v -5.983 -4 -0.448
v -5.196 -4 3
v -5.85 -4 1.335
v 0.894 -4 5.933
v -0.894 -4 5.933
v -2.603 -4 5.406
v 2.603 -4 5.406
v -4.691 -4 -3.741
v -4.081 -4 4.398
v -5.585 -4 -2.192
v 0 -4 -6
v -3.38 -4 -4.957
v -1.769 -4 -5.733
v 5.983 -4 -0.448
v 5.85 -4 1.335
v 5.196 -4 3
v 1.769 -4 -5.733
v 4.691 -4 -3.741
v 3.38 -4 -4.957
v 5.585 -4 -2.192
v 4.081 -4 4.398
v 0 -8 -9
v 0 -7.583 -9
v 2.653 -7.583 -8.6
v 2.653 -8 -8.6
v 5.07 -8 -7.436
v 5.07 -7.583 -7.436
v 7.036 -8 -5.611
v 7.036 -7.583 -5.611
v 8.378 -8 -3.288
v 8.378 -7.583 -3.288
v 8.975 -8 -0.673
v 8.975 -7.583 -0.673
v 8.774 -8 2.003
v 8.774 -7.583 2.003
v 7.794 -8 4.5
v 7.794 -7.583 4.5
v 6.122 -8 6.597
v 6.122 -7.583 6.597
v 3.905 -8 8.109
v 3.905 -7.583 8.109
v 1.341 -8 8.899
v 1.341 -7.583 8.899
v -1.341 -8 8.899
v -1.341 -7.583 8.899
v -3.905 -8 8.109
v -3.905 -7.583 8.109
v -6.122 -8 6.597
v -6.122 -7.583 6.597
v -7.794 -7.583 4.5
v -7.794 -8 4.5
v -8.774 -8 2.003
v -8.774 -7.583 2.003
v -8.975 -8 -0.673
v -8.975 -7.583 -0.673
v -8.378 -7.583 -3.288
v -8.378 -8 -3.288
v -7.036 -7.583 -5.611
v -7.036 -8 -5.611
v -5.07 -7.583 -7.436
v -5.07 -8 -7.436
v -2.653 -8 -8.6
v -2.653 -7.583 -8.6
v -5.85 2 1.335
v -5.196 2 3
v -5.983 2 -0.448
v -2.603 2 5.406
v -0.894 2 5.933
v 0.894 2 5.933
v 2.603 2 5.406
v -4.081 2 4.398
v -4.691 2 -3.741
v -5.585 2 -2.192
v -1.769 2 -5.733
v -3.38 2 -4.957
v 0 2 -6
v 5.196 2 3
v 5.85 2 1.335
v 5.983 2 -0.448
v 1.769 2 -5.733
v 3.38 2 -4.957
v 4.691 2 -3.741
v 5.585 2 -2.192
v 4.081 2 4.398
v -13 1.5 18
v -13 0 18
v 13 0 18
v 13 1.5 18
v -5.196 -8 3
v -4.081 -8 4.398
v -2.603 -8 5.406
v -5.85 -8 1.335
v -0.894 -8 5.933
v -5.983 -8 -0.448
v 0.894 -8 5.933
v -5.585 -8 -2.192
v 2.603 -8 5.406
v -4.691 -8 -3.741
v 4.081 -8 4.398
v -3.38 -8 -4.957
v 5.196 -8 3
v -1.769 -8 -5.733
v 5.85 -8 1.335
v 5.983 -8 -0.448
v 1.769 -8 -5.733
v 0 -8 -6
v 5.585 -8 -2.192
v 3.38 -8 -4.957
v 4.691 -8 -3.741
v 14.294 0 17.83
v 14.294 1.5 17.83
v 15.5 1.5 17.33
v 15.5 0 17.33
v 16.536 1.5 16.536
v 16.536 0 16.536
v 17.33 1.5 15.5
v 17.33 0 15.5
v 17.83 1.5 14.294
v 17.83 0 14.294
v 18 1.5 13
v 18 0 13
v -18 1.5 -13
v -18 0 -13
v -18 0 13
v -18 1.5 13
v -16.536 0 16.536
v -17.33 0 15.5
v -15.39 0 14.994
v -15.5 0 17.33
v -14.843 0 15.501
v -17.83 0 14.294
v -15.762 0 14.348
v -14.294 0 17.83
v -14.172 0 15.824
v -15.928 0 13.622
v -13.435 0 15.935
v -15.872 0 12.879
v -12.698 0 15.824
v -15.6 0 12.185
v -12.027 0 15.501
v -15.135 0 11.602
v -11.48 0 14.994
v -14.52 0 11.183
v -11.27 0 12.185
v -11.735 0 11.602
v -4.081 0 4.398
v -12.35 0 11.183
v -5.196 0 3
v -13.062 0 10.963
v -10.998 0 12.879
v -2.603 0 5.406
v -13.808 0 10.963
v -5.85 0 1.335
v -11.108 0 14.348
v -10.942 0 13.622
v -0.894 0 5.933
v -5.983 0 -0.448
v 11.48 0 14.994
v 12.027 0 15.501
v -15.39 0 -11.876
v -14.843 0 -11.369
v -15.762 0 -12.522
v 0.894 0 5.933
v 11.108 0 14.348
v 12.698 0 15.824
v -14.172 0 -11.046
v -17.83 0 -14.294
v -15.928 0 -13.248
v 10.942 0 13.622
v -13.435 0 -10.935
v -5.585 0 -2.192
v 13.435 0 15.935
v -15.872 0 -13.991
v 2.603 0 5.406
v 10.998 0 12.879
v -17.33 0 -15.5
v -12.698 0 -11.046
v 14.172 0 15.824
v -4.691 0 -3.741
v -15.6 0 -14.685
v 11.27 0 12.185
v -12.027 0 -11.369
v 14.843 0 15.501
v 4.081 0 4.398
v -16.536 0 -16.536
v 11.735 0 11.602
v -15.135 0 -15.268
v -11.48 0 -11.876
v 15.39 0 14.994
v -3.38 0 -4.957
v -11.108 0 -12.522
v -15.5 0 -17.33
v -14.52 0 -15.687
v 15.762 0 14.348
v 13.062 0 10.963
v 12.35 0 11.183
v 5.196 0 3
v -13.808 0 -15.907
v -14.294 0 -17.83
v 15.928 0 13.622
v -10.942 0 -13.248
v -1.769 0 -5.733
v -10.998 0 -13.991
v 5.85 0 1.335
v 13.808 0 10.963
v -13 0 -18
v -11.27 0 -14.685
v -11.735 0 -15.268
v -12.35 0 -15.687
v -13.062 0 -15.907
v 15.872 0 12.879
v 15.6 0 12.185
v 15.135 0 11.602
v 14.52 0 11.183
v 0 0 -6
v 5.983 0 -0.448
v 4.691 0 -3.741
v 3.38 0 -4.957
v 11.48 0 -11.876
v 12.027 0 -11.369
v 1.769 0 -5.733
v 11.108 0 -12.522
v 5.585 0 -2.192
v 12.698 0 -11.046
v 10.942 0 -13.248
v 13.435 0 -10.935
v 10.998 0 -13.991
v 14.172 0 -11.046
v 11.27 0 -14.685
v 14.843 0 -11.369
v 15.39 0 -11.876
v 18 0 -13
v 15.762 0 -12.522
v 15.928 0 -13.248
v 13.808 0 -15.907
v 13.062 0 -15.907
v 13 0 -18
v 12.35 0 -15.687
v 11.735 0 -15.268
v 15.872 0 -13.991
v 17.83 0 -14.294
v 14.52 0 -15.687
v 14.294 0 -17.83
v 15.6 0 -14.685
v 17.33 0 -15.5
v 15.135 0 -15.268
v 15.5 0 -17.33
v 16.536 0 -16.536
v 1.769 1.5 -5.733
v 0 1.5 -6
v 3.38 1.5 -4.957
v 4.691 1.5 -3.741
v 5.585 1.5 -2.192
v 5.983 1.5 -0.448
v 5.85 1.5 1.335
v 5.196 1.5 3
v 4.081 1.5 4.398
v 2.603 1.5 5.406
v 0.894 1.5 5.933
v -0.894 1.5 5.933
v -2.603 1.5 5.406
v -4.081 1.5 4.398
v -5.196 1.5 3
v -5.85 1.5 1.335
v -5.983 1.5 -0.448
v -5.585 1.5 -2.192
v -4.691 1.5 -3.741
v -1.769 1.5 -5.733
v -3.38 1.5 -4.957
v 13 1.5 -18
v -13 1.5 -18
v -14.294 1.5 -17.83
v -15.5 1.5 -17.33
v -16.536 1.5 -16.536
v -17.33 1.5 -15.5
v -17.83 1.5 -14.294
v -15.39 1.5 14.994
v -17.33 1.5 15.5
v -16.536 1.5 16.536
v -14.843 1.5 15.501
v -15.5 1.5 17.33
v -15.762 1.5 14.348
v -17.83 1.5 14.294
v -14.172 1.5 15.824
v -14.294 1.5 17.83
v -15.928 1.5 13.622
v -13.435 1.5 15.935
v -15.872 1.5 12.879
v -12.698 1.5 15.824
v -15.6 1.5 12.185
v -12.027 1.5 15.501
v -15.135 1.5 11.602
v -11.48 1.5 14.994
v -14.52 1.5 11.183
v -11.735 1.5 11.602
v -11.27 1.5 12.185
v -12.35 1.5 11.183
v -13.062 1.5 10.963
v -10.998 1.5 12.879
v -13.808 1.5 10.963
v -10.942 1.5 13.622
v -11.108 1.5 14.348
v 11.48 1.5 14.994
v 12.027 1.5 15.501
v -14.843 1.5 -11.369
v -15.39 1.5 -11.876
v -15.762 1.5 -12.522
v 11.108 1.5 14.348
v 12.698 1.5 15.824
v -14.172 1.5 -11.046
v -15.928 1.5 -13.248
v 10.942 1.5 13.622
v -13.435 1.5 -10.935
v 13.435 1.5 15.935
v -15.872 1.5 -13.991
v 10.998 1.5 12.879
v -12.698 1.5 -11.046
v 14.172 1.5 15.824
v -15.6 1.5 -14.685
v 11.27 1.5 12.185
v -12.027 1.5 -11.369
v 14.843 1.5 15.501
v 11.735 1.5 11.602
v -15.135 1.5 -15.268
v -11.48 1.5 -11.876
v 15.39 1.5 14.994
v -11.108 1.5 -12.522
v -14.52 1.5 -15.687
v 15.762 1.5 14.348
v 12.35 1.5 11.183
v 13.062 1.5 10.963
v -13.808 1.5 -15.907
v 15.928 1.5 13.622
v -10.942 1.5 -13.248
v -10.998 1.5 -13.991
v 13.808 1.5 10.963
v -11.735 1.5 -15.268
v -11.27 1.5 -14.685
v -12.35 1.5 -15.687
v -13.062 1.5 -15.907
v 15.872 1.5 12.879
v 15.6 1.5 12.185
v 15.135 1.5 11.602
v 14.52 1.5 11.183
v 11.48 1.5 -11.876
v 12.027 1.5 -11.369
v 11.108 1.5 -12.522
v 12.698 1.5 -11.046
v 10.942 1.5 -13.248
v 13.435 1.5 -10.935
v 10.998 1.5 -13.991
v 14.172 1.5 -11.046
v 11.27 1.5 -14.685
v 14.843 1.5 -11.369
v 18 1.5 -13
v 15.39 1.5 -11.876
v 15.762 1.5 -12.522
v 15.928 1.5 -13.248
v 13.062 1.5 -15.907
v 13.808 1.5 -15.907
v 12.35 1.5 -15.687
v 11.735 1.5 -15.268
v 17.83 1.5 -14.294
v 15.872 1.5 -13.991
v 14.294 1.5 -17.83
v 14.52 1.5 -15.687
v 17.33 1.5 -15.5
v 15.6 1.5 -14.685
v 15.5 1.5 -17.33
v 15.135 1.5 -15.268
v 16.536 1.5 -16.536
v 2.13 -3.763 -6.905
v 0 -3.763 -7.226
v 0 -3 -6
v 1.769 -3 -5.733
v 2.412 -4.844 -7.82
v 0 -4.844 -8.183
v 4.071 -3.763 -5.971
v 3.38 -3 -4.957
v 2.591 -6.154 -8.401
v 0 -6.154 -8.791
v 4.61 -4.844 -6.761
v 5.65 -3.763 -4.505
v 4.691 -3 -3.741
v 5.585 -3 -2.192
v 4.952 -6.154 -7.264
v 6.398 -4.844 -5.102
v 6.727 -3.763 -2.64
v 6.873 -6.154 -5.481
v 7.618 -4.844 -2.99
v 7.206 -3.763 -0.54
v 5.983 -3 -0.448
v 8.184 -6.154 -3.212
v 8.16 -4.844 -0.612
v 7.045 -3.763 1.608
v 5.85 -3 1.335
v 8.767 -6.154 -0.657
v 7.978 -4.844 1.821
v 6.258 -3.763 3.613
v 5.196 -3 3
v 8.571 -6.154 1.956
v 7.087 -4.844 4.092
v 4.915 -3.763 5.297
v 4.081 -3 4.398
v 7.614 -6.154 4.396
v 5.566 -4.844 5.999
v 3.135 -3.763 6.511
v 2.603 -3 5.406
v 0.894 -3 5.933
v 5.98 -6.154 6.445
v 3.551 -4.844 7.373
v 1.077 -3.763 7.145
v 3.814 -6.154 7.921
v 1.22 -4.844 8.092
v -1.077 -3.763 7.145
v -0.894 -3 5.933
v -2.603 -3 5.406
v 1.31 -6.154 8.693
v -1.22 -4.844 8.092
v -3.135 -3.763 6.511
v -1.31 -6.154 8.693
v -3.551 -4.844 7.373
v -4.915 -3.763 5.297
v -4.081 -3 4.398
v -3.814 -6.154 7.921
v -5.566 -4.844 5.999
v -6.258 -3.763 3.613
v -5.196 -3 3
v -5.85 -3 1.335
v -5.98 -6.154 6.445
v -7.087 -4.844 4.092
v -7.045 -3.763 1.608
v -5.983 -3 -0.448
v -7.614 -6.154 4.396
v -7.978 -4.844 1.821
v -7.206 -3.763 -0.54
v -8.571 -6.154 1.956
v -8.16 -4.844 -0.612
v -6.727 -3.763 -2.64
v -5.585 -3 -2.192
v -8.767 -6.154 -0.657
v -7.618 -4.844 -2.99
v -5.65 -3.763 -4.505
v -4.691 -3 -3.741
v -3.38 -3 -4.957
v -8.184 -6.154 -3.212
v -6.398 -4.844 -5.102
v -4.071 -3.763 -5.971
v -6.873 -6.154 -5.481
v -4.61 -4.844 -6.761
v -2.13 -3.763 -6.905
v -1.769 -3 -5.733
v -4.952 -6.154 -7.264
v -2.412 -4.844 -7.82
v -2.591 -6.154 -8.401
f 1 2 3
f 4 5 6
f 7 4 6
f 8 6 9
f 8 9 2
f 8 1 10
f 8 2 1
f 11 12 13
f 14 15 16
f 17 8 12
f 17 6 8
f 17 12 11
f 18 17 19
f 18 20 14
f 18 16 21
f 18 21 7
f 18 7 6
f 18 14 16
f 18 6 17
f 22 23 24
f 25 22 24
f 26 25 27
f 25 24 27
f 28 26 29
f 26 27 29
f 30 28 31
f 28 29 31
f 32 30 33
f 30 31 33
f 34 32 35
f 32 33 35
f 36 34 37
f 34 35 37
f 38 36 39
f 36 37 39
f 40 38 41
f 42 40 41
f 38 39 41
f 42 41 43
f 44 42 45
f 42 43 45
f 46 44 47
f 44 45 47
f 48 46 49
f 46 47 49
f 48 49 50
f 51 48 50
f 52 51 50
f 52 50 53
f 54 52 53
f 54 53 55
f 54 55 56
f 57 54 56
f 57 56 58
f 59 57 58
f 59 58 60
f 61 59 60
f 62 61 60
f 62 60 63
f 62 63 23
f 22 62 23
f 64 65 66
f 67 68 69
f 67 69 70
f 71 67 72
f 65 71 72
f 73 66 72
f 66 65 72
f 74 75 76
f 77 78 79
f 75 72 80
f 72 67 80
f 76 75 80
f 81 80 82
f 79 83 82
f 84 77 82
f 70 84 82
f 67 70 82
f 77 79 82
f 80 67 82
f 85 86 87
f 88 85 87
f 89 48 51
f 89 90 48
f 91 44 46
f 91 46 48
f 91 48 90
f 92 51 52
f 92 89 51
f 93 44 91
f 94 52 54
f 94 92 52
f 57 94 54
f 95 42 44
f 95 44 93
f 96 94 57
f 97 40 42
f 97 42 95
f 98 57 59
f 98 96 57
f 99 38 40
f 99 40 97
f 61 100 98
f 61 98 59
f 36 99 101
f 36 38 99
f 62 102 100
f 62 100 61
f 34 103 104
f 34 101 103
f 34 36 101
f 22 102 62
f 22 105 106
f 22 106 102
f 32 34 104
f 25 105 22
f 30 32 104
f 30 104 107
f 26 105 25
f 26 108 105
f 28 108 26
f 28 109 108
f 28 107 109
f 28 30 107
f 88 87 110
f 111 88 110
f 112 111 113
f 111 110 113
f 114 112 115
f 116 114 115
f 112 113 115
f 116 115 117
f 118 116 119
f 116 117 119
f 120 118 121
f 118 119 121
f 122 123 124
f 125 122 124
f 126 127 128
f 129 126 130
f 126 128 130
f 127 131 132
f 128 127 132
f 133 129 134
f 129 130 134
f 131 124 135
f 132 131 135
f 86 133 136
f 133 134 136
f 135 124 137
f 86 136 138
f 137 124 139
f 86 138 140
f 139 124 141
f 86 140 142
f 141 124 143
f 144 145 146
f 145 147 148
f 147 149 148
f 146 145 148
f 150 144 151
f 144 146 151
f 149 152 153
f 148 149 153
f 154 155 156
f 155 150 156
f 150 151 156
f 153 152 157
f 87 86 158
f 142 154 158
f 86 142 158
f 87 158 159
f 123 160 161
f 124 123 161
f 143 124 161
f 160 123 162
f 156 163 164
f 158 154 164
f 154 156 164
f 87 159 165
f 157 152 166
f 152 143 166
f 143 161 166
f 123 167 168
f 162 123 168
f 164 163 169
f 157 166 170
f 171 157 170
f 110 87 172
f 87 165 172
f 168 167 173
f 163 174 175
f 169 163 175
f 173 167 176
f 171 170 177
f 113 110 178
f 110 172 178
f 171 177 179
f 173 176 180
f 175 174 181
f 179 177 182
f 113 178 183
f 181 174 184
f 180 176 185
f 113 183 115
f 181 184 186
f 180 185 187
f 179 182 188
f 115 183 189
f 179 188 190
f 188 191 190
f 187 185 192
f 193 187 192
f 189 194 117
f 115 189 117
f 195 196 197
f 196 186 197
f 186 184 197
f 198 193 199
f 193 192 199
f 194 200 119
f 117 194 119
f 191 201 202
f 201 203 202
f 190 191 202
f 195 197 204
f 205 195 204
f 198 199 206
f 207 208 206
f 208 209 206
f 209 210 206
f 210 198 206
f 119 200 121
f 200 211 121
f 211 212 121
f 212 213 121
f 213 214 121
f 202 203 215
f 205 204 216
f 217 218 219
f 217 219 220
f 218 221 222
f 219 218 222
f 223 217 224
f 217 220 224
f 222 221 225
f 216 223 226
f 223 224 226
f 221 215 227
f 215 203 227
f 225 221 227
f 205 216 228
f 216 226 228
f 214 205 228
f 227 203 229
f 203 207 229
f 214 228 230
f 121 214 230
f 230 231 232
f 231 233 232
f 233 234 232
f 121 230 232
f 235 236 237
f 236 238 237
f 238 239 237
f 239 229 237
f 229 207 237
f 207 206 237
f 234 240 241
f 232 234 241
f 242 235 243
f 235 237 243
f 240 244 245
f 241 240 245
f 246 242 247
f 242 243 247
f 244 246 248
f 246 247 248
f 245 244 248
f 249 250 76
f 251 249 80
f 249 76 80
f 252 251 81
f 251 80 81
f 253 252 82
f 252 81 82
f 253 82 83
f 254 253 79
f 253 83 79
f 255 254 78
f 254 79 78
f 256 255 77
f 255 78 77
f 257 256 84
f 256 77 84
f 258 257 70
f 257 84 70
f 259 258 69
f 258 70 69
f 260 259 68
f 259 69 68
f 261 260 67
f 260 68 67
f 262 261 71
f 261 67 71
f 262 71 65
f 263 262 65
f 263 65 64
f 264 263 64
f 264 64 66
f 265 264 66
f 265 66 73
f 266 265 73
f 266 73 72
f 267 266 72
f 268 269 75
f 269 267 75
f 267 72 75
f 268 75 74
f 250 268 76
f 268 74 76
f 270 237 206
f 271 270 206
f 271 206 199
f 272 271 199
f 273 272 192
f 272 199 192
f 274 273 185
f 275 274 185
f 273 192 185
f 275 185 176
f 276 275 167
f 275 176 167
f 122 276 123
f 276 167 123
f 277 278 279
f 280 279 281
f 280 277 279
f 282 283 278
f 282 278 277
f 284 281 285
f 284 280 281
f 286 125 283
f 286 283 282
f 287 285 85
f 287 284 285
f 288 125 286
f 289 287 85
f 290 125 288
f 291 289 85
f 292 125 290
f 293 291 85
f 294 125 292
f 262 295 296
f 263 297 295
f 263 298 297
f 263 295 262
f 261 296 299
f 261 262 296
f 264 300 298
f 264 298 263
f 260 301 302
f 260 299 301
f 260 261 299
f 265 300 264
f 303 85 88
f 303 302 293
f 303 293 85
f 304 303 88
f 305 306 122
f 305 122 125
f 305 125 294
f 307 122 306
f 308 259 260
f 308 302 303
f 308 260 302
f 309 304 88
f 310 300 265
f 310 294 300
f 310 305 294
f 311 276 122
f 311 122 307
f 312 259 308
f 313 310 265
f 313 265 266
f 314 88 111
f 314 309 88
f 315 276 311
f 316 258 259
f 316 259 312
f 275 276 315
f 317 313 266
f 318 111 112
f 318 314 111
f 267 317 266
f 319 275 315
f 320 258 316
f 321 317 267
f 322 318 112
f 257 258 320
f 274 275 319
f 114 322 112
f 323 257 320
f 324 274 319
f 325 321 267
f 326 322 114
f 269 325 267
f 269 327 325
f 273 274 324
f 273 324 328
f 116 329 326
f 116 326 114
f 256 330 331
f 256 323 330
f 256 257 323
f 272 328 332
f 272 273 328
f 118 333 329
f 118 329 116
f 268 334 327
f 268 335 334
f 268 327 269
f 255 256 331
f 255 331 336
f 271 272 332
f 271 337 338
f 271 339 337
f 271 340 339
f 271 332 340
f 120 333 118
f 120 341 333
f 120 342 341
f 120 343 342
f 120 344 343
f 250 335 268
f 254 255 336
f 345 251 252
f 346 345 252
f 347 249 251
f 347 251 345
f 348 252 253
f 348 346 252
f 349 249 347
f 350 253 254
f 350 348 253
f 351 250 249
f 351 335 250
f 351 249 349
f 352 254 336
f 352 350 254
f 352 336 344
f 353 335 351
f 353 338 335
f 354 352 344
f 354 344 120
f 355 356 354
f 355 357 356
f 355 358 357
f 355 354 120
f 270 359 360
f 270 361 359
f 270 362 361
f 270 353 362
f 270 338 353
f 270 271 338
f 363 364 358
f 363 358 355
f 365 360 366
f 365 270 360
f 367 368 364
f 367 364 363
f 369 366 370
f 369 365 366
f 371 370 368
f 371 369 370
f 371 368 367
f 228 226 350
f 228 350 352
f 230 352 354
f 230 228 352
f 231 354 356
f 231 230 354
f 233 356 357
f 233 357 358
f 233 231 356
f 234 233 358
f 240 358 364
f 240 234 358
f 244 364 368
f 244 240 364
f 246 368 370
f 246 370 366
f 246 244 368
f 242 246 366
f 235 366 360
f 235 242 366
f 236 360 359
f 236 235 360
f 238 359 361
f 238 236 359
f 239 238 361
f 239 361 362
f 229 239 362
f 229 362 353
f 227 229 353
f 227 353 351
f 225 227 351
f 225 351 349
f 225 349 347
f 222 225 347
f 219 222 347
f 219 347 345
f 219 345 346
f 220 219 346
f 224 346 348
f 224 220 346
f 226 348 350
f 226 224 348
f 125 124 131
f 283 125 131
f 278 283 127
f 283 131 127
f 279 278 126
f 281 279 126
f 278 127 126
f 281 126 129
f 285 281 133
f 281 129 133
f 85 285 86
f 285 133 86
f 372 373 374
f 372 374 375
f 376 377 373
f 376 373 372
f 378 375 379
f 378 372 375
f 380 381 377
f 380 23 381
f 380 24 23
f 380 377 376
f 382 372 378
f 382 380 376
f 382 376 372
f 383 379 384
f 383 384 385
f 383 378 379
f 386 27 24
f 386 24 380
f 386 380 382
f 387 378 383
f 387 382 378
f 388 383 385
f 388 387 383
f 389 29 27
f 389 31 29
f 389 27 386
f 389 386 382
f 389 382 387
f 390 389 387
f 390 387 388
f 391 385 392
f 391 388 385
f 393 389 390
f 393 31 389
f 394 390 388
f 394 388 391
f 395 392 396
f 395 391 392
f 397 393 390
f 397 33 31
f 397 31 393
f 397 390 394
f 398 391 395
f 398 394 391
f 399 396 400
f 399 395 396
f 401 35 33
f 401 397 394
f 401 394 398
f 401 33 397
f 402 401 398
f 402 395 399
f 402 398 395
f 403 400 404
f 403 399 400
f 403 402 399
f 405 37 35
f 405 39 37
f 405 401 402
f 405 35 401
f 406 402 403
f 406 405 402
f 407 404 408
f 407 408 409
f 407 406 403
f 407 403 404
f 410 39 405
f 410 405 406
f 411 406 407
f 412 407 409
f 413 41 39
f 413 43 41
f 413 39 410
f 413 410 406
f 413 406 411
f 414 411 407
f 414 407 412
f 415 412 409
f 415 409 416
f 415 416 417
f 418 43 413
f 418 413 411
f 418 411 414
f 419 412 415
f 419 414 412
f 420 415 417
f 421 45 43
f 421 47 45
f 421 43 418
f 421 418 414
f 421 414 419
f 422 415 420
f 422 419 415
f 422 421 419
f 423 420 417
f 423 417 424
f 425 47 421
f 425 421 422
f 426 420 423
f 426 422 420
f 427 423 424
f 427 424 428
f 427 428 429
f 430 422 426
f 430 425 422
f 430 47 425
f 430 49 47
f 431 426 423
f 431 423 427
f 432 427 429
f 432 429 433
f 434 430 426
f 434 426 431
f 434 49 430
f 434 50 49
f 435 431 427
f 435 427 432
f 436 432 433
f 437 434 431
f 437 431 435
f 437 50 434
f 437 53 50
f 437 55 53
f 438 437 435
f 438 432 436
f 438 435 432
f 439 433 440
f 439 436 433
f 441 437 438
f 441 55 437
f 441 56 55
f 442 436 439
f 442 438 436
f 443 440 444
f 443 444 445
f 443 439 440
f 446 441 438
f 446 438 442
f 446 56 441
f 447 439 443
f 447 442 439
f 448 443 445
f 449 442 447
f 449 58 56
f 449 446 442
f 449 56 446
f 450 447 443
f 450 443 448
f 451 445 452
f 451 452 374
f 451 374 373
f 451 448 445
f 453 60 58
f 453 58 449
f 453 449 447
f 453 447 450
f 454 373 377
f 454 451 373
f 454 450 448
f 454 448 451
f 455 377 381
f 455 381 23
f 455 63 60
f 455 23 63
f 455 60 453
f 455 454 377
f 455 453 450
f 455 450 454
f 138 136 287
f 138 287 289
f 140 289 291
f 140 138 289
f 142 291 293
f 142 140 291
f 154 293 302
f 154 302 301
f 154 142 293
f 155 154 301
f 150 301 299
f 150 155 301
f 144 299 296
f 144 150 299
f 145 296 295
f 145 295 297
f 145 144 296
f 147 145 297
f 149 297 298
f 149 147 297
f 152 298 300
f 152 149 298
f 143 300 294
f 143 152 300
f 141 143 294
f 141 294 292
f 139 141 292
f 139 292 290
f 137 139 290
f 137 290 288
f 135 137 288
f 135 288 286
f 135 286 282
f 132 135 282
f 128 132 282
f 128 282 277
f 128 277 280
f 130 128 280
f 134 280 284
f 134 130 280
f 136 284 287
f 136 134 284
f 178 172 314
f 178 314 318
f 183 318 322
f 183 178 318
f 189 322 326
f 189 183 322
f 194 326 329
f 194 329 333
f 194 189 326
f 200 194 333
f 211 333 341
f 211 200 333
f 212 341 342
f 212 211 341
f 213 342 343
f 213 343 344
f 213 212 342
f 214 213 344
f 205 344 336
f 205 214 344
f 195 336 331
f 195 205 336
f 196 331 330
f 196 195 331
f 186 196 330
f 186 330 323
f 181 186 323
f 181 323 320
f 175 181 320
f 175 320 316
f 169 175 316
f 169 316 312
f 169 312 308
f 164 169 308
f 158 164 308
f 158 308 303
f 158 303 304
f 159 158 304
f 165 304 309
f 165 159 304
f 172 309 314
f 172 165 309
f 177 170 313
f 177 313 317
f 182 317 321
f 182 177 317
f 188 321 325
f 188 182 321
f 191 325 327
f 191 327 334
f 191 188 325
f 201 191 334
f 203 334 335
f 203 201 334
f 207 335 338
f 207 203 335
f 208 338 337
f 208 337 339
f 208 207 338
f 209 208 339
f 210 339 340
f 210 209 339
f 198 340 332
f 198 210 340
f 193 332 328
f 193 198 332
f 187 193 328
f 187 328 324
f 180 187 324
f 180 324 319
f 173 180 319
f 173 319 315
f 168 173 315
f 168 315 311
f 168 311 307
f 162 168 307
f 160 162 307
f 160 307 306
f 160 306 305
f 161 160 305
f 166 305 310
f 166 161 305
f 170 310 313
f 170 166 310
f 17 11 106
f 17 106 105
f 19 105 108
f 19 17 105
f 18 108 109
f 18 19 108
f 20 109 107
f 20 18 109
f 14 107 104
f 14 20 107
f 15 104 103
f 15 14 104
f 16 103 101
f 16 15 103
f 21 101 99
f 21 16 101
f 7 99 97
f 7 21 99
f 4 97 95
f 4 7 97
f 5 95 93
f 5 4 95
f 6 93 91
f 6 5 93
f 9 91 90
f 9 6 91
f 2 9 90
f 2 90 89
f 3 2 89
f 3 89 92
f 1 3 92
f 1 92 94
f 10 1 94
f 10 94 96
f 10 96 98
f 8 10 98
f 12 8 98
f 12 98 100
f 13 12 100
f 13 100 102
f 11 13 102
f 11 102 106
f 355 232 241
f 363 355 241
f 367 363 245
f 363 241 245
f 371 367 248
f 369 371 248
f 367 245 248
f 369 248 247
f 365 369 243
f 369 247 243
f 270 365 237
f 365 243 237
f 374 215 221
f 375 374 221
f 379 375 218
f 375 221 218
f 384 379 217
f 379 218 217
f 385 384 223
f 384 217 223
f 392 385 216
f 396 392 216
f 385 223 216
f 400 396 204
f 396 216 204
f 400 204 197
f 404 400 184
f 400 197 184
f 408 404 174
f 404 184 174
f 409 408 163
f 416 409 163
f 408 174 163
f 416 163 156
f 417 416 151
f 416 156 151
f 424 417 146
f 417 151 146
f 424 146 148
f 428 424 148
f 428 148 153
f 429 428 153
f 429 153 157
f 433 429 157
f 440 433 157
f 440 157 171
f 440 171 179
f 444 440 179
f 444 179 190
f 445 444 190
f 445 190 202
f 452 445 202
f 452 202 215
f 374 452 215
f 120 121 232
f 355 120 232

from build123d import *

# Parameters (mm, degrees)
SKETCH1_R                = 2.5
BOSS_EXTRUDE1_DEPTH      = 1.5
BOSS_EXTRUDE2_DEPTH      = 4
BOSS_EXTRUDE2_DEPTH_BACK = 2
SKETCH2_R                = 6
SKETCH3_R                = 9
SKETCH3_R_2              = 6
BOSS_EXTRUDE3_DEPTH      = 5
FILLET1_R                = 5


with BuildPart() as part:
    # Sketch1 → Boss-Extrude1 (new body)
    with BuildSketch(Plane(origin=(0, 0, 0), x_dir=(1, 0, 0), z_dir=(0, 1, 0))):
        with BuildLine():
            Line((-13, -18), (13, -18))
            ThreePointArc((13, -18), (16.535533906, -16.535533906), (18, -13))
            Line((18, -13), (18, 13))
            ThreePointArc((18, 13), (16.535533906, 16.535533906), (13, 18))
            Line((13, 18), (-13, 18))
            ThreePointArc((-13, 18), (-16.535533906, 16.535533906), (-18, 13))
            Line((-18, 13), (-18, -13))
            ThreePointArc((-18, -13), (-16.535533906, -16.535533906), (-13, -18))
        make_face()
        with Locations(Location((13.435028843, 13.435028843, 0), (0, 0, 270))):
            Circle(SKETCH1_R, mode=Mode.SUBTRACT)
        with Locations(Location((-13.435028843, -13.435028843, 0), (0, 0, 270))):
            Circle(SKETCH1_R, mode=Mode.SUBTRACT)
        with Locations(Location((-13.435028843, 13.435028843, 0), (0, 0, 270))):
            Circle(SKETCH1_R, mode=Mode.SUBTRACT)
        with Locations(Location((13.435028843, -13.435028843, 0), (0, 0, 270))):
            Circle(SKETCH1_R, mode=Mode.SUBTRACT)
    extrude(amount=BOSS_EXTRUDE1_DEPTH)

    # Sketch2 → Boss-Extrude2 (add, two sides: drawn at the far end of the back side and taken through both)
    with BuildSketch(Plane.XZ.offset(-BOSS_EXTRUDE2_DEPTH_BACK)):
        with Locations(Location((0, 0, 0), (0, 0, 270))):
            Circle(SKETCH2_R)
    extrude(amount=BOSS_EXTRUDE2_DEPTH + BOSS_EXTRUDE2_DEPTH_BACK)

    # Sketch3 → Boss-Extrude3 (add)
    with BuildSketch(Plane(origin=(0, -3, 0), x_dir=(-1, 0, 0), z_dir=(0, -1, 0))):
        with Locations(Location((0, 0, 0), (0, 0, 90))):
            Circle(SKETCH3_R)
        with Locations(Location((0, 0, 0), (0, 0, 90))):
            Circle(SKETCH3_R_2, mode=Mode.SUBTRACT)
    extrude(amount=BOSS_EXTRUDE3_DEPTH)

    # Fillet1
    # the kernel refuses this fillet: 5 mm, written as the material it takes off along each edge
    with BuildSketch(Plane(origin=(0, -3, 0), x_dir=(0, 0, -1), z_dir=(-1, 0, 0))) as fillet1_piece_1:
        with BuildLine():
            CenterArc((4, 4.582575695), FILLET1_R, 293.578178478, 66.421821522)
            Line((9, 4.582575695), (9.1, 4.582575695))
            Line((9.1, 4.582575695), (9.1, 0))
            Line((9.1, 0), (9, -0.1))
            ThreePointArc((9, -0.1), (7.5, -0.1), (6.04, -0.091651514))
            Line((6.04, -0.091651514), (6, 0))
        make_face()
    revolve(axis=Axis((0, -3, 0), (0, -1, 0)), mode=Mode.SUBTRACT)


solid = part.part
